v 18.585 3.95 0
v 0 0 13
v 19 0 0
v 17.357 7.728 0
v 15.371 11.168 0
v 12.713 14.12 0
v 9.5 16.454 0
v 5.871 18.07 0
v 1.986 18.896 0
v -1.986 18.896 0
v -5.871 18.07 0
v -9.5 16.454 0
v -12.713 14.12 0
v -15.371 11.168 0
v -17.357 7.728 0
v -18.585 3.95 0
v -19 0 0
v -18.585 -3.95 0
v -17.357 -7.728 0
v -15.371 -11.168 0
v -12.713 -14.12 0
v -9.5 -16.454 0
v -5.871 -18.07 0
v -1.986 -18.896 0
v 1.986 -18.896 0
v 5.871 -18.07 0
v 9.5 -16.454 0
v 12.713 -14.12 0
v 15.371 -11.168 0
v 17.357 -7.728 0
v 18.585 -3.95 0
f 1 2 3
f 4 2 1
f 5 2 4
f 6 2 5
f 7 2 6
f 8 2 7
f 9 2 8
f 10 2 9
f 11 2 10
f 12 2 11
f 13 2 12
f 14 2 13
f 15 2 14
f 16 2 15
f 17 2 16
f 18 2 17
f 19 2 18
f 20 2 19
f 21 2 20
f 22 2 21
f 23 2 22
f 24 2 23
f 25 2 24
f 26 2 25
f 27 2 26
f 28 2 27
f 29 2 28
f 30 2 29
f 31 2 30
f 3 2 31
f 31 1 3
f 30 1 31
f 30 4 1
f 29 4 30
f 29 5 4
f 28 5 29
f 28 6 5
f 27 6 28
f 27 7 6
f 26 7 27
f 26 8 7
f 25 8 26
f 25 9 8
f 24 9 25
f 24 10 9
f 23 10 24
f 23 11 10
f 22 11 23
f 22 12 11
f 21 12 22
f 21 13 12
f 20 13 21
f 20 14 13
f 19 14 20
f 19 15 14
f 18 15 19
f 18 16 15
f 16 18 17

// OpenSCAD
// Generated by SolidPython 1.0.1 on 2020-07-29 00:46:43


cylinder(h = 13, r1 = 19, r2 = 0);
/***********************************************
*********      SolidPython code:      **********
************************************************
 
# import packages: SolidPython
from solid import *
from solid.utils import *
from itertools import chain, combinations, permutations


class Resize:

    def __init__(self, scad_file):
        self.scad_file = scad_file
        #self.scad_file = import_scad(scad_file)
        # cone/cylinder param:
        self.r1 = 0
        self.r2 = 0
        self.h = 0
        # rectangular prism param:
        self.w = 0
        self.l = 0
        # ellipse param:
        self.r = 0

    # import OpenScad code (file name corresponds to shape)


    # classify shape + parameters
    def assign(self, param1, param2, param3):
        if self.scad_file == 'cone.scad':
            self.r1 = param1
            self.r2 = param2
            self.h = param3
        elif self.scad_file == 'cylinder.scad':
            self.r1 = param1
            self.r2 = param2
            self.h = param3
        elif self.scad_file == 'rectangularPrism.scad':
            self.h = param1
            self.l = param2
            self.w = param3
        else:
            self.r = param1
            self.h = param2

    # resize parameters
    def iterate(self):
        x = range(3, 20, 2)
        i = 1
        if self.scad_file == 'cone.scad':
            tempList = list(permutations(x, 2))
            for temp in tempList:
                param1 = temp[0]
                param2 = temp[1]
                filepath = 'produced_scad_files/' + 'cone' + str(param1) + '_' + str(param2) + '_' + '.scad'
                scad_render_to_file(cylinder(h=param1, r1=param2, r2=0), filepath)

        elif self.scad_file == 'cylinder.scad':
            tempList = list(permutations(x, 3))
            for temp in tempList:
                param1 = temp[0]
                param2 = temp[1]
                filepath = 'produced_scad_files/' + 'cylinder' + str(param1) + '_' + str(param2) + '_' + '.scad'
                scad_render_to_file(cylinder(h=param1, r1=param2, r2=param2), filepath)

        elif self.scad_file == 'rectangularPrism.scad':
            tempList = list(permutations(x, 3))
            for temp in tempList:
                param1 = temp[0]
                param2 = temp[1]
                param3 = temp[2]
                filepath = 'produced_scad_files/' + 'rectangularPrism' + str(param1) + '_' + str(param2) + '_' + str(
                    param3) + '.scad'
                scad_render_to_file(cube(size=(param1, param2, param3)), filepath)

        elif self.scad_file == 'ellipse.scad':
            tempList = list(permutations(x, 4))
            for temp in tempList:
                param1 = temp[0]
                param2 = temp[1]
                param3 = temp[2]
                param4 = temp[3]
                filepath = 'produced_scad_files/' + 'ellipse' + str(param1) + '_' + str(param2) + '_' + str(param3) + '_' + str(param4) + '.scad'
                scad_render_to_file(scale([param1, param2, param3])(sphere(r=param4)), filepath)

    def render_to_scadfile(self):
        scad_render_to_file(scad, 'example.scad') 
 
************************************************/
